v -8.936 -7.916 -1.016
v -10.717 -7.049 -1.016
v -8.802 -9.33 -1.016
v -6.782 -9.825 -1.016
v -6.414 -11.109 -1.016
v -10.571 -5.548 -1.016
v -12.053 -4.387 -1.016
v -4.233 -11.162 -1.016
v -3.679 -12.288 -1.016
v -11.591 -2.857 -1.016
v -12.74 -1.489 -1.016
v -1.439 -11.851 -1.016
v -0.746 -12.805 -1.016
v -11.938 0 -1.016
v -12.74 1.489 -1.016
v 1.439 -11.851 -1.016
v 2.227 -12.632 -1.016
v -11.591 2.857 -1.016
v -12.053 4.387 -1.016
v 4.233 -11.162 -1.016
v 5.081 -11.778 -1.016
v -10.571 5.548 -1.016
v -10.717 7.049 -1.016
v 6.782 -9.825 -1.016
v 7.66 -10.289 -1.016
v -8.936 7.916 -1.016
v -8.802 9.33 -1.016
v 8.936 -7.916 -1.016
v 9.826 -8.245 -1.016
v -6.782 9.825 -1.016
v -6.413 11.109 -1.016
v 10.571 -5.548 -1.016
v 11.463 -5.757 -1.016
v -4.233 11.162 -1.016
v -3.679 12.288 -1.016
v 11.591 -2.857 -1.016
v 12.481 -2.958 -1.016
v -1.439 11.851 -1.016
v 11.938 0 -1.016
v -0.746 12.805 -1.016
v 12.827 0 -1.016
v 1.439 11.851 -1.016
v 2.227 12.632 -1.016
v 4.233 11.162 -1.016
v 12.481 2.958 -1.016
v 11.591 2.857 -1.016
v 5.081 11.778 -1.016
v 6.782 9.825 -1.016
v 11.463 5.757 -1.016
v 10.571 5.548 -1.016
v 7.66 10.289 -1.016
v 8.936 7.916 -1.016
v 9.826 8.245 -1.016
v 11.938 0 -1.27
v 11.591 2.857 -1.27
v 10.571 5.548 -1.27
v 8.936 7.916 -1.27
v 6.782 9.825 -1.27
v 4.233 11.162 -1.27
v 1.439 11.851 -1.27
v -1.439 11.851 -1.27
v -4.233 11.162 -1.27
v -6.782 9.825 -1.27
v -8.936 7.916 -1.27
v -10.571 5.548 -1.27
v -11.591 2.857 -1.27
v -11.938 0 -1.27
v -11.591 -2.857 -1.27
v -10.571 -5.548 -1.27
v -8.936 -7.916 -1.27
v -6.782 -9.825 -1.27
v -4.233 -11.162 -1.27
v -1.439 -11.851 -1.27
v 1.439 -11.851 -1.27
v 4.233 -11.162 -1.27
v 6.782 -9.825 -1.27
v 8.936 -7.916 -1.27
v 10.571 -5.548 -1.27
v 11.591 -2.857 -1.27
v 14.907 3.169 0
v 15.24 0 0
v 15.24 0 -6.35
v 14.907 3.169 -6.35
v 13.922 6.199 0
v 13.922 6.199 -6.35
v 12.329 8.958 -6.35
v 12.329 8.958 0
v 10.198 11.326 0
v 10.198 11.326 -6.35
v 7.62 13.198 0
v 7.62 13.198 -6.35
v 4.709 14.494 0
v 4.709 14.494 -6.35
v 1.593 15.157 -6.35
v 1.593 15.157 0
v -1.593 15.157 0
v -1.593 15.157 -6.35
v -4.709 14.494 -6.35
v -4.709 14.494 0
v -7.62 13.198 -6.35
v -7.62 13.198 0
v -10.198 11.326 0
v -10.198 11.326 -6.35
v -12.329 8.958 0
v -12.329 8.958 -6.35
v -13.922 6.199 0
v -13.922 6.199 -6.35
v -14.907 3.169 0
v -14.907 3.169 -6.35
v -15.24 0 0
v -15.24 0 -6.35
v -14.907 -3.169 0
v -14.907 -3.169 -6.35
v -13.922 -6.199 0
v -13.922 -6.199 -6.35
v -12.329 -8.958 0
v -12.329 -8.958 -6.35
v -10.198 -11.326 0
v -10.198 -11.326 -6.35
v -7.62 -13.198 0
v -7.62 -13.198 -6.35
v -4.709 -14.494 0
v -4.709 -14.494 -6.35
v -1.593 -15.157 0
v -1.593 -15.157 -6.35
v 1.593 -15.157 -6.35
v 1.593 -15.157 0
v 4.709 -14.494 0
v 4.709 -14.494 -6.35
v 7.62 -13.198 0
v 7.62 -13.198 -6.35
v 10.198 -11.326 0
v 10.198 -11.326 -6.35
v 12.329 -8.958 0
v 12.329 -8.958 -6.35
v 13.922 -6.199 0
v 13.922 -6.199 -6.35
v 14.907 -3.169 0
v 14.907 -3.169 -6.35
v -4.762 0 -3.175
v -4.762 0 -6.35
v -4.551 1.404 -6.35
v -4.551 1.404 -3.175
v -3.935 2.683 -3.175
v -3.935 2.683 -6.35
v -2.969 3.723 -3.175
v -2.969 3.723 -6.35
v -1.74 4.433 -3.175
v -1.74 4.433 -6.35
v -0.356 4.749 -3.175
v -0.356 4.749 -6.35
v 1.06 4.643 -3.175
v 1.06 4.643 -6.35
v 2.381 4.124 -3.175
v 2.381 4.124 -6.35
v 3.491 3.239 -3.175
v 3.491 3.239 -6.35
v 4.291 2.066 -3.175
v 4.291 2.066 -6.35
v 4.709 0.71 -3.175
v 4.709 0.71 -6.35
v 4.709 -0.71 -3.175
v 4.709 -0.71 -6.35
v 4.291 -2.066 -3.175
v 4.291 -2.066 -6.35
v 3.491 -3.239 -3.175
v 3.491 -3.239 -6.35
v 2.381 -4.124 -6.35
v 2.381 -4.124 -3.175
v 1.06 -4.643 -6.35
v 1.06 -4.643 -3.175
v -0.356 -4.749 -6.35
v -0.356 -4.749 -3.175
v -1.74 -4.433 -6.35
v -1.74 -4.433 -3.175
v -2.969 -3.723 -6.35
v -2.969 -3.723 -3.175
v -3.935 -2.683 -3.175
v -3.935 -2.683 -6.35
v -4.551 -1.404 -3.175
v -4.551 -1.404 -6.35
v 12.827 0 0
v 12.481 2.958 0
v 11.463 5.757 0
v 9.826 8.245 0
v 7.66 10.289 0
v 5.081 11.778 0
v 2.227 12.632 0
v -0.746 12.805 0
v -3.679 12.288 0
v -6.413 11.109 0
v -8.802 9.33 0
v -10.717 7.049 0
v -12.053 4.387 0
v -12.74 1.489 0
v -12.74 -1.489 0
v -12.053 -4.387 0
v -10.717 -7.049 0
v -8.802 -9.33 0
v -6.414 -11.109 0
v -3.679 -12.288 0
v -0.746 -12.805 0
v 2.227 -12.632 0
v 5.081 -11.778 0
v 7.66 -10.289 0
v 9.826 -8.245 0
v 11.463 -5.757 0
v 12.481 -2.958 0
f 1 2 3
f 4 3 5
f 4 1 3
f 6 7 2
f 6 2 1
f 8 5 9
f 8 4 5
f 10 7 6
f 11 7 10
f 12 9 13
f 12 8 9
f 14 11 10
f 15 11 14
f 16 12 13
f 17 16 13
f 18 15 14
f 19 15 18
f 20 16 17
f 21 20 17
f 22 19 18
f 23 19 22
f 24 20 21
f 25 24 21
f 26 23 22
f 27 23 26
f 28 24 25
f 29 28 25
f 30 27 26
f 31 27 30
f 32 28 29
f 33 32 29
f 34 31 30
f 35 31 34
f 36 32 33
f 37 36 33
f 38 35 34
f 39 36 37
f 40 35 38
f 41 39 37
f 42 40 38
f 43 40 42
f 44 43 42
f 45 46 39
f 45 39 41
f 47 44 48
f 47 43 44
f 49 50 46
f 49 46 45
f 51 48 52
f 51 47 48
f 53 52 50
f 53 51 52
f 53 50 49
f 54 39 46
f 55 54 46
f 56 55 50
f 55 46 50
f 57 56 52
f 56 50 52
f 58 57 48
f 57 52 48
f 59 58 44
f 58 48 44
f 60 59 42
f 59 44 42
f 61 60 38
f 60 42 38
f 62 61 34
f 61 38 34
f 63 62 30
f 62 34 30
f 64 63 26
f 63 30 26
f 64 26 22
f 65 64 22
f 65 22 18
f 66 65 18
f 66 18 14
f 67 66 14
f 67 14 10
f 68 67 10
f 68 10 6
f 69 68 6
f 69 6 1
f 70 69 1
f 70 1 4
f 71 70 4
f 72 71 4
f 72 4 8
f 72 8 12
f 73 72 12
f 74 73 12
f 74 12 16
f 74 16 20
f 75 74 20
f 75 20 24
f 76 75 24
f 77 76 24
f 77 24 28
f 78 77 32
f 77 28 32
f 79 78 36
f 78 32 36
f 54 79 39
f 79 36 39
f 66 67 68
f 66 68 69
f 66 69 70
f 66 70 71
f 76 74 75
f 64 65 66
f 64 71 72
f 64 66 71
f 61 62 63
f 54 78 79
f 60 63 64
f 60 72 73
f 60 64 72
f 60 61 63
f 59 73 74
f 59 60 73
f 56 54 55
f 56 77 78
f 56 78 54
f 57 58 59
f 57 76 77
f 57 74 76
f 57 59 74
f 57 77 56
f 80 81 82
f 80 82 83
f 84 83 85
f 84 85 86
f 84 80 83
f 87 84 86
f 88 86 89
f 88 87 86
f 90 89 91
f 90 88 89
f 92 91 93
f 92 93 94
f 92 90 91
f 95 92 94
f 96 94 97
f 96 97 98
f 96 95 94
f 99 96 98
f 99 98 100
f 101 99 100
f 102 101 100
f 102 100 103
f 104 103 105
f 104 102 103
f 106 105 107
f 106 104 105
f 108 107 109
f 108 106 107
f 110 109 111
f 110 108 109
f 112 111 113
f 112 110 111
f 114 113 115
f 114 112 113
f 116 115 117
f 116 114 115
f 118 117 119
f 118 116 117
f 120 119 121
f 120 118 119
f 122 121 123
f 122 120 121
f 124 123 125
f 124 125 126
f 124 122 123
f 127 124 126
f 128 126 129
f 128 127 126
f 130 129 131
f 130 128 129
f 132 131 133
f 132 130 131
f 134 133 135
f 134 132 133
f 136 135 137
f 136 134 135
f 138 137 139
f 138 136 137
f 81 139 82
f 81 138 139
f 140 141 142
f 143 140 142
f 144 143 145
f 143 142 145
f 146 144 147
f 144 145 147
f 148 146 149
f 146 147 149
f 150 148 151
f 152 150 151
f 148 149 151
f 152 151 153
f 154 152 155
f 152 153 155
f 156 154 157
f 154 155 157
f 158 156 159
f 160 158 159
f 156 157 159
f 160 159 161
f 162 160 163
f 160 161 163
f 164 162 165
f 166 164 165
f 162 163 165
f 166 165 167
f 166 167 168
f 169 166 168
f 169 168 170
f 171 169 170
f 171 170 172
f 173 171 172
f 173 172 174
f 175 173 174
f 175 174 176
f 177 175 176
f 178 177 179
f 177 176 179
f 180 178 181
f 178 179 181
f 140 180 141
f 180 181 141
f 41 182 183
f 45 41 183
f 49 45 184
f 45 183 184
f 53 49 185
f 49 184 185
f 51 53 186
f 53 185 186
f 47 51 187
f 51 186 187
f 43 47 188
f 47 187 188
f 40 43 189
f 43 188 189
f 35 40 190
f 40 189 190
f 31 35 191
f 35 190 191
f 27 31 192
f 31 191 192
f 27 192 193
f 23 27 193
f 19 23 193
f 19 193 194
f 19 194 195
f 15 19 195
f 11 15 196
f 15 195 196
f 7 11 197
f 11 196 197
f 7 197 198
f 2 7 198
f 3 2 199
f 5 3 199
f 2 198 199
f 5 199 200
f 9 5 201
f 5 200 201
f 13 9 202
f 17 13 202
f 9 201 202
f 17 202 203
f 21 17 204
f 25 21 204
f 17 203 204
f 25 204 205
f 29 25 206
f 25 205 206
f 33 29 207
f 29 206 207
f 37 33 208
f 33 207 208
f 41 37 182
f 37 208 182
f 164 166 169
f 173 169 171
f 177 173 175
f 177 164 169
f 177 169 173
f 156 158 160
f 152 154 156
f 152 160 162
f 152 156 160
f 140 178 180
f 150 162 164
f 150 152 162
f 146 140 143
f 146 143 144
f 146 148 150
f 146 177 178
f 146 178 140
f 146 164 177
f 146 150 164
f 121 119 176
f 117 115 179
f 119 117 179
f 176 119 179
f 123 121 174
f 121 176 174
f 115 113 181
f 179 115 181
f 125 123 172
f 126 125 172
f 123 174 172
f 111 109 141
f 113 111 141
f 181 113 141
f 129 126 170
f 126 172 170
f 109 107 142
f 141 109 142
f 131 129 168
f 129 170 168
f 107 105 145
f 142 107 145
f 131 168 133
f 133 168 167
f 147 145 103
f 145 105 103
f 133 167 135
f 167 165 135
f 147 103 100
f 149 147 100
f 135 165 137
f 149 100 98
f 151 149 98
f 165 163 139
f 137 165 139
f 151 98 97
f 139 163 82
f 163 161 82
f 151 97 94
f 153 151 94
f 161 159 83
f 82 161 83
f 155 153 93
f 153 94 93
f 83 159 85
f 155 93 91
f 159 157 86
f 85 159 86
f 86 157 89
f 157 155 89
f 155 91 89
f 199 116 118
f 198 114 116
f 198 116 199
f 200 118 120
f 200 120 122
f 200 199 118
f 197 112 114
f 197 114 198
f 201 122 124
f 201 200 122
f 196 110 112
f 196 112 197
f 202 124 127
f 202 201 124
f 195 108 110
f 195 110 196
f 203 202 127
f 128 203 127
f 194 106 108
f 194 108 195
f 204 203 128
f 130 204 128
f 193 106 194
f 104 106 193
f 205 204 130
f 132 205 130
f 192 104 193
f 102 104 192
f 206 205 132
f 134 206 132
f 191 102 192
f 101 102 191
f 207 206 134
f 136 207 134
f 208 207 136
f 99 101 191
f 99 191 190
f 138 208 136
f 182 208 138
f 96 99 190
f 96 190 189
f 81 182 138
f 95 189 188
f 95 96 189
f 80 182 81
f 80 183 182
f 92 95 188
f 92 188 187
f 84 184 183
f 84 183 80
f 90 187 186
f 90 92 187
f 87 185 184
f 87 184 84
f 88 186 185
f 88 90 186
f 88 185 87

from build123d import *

# Parameters (mm, degrees)
BACKER_MAIN_R              = 15.24
BOSS_EXTRUDE1_DEPTH        = 6.35
SUBSTRATE_BACK_CLEARANCE_R = 11.938
CUT_EXTRUDE1_DEPTH         = 1.27
SUBSTRATE_CSINK_R          = 12.827
CUT_EXTRUDE2_DEPTH         = 1.016
SPRING_HOLE_R              = 4.7625
CUT_EXTRUDE3_DEPTH         = 3.175


with BuildPart() as part:
    # Backer Main → Boss-Extrude1 (new body)
    with BuildSketch(Plane.XY):
        Circle(BACKER_MAIN_R)
    extrude(amount=-BOSS_EXTRUDE1_DEPTH)

    # Substrate Back Clearance → Cut-Extrude1 (cut)
    with BuildSketch(Plane.XY):
        Circle(SUBSTRATE_BACK_CLEARANCE_R)
    extrude(amount=-CUT_EXTRUDE1_DEPTH, mode=Mode.SUBTRACT)

    # Substrate CSink → Cut-Extrude2 (cut)
    with BuildSketch(Plane.XY):
        Circle(SUBSTRATE_CSINK_R)
    extrude(amount=-CUT_EXTRUDE2_DEPTH, mode=Mode.SUBTRACT)

    # Spring Hole → Cut-Extrude3 (cut)
    with BuildSketch(Plane(origin=(0, 0, -6.35), x_dir=(-1, 0, 0), z_dir=(0, 0, -1))):
        Circle(SPRING_HOLE_R)
    extrude(amount=-CUT_EXTRUDE3_DEPTH, mode=Mode.SUBTRACT)


solid = part.part
